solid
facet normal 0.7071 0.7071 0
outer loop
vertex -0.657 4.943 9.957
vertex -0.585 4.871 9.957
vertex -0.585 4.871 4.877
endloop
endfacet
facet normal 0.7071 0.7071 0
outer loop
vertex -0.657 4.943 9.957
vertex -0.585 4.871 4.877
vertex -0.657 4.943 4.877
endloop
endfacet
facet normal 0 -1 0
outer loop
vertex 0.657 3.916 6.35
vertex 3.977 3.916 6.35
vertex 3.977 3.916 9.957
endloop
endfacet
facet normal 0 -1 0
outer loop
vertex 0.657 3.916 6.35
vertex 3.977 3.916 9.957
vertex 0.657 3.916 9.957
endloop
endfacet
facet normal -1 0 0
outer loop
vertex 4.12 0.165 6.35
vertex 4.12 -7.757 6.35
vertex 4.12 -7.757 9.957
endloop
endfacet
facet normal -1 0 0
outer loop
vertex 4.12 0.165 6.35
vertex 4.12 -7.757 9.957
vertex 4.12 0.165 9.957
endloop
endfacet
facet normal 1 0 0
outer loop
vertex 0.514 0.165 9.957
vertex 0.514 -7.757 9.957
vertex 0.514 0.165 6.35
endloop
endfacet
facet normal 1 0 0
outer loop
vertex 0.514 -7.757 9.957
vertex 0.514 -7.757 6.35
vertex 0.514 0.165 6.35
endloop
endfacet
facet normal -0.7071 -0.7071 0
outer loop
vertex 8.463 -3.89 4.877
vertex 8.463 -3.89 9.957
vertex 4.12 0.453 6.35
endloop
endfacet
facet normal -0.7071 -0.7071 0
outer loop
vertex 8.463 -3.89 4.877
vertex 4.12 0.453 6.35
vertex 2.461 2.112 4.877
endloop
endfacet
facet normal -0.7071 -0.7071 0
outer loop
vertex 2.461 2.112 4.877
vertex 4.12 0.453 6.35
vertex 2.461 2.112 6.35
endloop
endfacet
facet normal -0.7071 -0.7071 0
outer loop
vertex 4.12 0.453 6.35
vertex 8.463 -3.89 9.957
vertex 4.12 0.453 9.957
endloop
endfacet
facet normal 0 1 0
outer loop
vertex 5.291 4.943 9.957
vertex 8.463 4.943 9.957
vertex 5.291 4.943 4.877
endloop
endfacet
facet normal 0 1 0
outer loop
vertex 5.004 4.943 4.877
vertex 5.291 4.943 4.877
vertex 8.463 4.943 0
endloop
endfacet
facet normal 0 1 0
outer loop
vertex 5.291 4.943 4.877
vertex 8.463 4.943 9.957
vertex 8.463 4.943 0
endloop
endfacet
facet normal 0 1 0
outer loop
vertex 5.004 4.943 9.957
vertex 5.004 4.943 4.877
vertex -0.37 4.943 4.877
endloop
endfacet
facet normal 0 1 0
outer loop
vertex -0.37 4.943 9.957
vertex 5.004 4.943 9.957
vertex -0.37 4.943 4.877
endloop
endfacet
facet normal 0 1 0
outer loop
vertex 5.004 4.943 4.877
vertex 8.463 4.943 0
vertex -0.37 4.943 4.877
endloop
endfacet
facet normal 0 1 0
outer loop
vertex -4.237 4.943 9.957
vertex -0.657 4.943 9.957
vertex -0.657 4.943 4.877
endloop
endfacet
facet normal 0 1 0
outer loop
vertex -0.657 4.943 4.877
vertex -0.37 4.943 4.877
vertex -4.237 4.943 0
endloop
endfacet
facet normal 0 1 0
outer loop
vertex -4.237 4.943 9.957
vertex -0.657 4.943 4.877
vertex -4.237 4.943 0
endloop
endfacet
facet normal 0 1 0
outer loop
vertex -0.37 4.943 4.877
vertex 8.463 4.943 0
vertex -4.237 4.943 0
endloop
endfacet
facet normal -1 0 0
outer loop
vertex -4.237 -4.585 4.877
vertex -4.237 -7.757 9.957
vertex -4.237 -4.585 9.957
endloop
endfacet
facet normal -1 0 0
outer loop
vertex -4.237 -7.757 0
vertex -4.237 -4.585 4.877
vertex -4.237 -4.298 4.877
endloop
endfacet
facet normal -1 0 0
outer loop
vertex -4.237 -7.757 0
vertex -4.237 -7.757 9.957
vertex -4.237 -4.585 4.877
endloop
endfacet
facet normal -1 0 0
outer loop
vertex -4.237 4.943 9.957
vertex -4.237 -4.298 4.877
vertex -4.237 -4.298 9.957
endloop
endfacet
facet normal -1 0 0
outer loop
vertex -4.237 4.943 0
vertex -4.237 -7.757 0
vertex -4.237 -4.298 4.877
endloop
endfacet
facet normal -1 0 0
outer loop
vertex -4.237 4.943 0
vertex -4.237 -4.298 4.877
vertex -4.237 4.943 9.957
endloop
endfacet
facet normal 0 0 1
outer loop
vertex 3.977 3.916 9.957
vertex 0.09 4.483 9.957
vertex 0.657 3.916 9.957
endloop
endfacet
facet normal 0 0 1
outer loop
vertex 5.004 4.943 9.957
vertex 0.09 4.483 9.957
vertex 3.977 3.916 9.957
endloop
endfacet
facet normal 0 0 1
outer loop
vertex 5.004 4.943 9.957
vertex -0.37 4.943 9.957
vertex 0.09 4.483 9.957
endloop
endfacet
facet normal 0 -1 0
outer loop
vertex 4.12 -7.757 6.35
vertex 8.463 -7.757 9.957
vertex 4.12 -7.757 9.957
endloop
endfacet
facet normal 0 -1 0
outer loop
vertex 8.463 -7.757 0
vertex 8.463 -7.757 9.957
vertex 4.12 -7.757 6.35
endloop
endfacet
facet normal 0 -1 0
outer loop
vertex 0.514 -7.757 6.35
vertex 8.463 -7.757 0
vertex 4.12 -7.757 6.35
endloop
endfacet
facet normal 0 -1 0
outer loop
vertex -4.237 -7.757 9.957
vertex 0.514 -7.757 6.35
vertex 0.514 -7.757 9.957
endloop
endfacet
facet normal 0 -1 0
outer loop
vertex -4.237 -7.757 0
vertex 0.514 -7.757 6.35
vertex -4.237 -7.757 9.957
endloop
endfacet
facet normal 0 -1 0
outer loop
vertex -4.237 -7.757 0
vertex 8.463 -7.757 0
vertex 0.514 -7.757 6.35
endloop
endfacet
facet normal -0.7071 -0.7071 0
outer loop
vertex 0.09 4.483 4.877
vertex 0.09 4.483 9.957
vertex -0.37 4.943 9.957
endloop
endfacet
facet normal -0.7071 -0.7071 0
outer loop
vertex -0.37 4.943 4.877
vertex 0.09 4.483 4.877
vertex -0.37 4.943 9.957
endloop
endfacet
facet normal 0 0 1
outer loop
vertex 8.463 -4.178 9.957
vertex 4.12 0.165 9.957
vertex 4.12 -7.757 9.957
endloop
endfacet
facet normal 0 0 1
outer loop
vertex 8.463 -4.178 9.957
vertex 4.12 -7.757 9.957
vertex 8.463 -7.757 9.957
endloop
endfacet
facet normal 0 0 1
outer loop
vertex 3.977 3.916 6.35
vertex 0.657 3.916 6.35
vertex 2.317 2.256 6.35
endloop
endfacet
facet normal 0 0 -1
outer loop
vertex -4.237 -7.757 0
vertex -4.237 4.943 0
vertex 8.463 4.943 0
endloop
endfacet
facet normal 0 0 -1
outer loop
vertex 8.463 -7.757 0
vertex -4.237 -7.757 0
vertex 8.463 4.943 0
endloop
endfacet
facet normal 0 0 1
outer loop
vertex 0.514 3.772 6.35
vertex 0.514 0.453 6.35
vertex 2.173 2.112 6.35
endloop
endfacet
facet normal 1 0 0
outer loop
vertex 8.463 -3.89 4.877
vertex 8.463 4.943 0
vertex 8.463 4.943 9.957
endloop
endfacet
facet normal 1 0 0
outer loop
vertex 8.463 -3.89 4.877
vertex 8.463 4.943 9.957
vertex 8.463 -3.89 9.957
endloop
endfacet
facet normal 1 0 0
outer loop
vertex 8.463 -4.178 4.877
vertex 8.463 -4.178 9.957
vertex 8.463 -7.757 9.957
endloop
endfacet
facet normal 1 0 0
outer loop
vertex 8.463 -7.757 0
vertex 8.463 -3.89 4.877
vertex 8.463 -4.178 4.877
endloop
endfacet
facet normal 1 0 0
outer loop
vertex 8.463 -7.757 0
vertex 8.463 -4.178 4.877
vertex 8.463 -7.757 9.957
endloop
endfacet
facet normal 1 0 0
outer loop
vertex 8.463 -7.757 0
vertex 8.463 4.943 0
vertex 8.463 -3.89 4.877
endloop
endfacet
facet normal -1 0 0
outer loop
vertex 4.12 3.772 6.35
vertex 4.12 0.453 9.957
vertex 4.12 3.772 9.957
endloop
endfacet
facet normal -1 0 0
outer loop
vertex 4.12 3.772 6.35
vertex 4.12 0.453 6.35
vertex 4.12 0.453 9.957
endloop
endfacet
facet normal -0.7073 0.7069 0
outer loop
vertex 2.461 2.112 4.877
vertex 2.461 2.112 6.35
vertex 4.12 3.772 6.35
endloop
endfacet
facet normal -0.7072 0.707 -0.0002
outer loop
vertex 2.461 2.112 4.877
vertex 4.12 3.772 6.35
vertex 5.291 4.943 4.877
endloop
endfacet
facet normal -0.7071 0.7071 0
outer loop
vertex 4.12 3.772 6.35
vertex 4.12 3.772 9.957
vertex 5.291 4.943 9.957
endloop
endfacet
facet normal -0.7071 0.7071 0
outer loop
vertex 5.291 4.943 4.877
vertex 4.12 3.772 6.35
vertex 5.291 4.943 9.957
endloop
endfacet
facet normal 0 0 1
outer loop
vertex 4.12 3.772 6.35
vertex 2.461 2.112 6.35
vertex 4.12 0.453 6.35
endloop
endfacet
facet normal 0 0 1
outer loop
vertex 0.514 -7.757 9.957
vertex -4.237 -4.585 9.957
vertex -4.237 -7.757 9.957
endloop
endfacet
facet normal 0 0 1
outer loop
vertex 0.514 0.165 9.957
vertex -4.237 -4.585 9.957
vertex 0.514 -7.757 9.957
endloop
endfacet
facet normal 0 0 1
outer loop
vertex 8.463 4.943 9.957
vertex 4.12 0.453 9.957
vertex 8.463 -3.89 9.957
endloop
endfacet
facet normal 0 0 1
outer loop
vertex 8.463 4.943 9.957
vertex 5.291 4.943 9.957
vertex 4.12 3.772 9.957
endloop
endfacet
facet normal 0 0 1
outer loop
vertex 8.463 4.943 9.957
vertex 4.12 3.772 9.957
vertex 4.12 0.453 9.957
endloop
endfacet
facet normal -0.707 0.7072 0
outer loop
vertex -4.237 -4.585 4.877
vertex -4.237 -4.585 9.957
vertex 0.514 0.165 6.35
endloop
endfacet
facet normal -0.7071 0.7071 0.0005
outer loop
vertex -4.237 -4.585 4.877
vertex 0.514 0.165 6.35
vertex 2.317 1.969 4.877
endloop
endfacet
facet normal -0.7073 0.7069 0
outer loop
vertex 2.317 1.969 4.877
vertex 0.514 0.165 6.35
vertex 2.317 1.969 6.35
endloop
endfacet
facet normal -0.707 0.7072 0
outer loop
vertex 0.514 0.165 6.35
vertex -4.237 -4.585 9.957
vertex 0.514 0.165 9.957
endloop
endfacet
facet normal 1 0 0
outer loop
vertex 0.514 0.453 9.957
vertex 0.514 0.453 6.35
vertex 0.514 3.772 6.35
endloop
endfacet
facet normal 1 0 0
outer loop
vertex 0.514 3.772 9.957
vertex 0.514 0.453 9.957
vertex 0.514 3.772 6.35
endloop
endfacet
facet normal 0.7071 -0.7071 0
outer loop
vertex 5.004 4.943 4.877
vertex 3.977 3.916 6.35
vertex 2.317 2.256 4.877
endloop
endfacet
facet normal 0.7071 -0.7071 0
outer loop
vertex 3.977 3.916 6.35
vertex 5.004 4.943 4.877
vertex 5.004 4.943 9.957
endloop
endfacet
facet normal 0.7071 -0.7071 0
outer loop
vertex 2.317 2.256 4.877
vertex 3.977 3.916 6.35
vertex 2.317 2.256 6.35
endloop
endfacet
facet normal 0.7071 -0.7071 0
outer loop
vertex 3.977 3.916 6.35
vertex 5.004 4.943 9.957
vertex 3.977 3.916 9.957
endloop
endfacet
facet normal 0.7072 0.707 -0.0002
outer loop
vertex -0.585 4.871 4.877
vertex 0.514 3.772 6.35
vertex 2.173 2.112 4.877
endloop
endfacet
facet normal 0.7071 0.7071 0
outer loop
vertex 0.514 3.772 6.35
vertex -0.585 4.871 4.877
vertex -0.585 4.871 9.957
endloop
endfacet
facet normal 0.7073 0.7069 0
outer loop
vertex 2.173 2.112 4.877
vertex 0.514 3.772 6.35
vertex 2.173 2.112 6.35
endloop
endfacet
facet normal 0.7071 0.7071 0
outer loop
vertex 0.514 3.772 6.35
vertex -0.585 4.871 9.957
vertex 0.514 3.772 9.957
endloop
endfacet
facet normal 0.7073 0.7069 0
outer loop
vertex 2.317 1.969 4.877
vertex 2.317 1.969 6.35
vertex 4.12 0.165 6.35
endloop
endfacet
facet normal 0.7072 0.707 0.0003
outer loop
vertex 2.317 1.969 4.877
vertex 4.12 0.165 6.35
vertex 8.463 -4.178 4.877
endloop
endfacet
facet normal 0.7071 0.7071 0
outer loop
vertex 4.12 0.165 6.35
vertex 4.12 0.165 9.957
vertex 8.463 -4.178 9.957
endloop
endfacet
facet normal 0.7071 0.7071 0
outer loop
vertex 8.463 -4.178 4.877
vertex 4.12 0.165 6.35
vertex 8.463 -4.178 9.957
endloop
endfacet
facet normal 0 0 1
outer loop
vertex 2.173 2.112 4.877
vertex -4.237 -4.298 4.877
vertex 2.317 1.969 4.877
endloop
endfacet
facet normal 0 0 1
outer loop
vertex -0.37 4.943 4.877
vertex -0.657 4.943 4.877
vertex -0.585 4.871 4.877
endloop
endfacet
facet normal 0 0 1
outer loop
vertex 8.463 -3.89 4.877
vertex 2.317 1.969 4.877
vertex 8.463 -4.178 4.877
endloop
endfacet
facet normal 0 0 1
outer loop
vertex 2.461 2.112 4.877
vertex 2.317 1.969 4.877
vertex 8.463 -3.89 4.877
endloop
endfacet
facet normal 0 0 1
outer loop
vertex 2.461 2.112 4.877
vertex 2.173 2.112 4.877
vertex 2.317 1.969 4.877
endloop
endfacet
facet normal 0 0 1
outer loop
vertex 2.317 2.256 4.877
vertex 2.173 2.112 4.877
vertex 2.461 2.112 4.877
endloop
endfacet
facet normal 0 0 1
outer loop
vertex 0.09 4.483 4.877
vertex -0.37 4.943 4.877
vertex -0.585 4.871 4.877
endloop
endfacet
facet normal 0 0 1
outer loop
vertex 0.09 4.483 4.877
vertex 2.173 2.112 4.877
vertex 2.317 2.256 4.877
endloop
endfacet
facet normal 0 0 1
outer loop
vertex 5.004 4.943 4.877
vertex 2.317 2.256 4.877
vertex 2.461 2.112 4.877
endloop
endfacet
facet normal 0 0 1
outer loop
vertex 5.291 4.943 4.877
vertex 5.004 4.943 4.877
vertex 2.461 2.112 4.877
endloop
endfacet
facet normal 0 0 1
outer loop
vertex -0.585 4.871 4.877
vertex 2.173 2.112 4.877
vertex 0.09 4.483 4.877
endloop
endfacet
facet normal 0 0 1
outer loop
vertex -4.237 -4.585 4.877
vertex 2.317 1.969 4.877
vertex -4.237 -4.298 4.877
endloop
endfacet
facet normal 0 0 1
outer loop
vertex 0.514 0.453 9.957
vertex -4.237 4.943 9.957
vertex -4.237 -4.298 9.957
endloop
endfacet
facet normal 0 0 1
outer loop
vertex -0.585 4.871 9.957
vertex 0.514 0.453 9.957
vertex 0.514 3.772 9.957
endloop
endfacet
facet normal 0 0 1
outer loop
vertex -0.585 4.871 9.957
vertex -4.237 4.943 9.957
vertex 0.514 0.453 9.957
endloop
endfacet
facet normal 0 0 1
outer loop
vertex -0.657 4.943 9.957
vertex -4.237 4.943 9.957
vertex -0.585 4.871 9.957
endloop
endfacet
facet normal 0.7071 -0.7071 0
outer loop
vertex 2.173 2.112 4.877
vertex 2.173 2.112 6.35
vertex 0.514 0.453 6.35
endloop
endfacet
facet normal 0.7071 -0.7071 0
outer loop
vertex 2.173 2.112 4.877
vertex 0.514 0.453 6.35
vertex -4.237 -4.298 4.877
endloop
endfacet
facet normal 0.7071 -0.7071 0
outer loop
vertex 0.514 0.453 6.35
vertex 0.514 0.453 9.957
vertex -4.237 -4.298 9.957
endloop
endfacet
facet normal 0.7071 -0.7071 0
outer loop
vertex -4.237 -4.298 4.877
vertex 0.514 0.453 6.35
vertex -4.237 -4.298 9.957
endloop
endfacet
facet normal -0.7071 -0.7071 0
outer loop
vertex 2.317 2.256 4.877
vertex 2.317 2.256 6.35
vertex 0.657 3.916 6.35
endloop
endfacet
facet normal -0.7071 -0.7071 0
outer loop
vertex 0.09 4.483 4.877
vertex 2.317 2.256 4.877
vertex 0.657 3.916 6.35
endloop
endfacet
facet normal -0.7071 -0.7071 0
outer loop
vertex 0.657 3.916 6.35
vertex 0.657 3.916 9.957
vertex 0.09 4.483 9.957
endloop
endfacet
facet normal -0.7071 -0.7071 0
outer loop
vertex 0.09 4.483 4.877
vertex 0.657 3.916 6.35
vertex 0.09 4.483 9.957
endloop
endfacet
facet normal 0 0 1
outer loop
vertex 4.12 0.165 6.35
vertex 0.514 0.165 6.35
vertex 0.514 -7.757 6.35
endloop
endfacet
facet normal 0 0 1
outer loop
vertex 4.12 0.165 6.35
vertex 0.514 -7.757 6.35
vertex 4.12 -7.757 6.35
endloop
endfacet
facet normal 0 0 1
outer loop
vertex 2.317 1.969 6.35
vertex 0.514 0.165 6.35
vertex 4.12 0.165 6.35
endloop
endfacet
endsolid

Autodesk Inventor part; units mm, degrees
ref_plane "YZ Plane" through (0, 0, 0) normal (1, 0, 0) x (0, 1, 0)
ref_plane "XZ Plane" through (0, 0, 0) normal (0, 1, 0) x (-1, 0, 0)
ref_plane "XY Plane" through (0, 0, 0) normal (0, 0, 1) x (1, 0, 0)
sketch "Sketch1" plane through (0, 0, 0) normal (0, 0, 1) x (1, 0, 0)
  line L0 (-4.2367, 4.9428) -> (8.4633, 4.9428)
  line L1 (8.4633, 4.9428) -> (8.4633, -7.7572)
  line L2 (8.4633, -7.7572) -> (-4.2367, -7.7572)
  line L3 (-4.2367, -7.7572) -> (-4.2367, 4.9428)
  point P0 (0, 0)
  dimension "d0" = 12.7
  dimension "d1" = 12.7
extrude "Extrusion1" add sketch "Sketch1" along normal blind 6.35
sketch "Sketch2" plane through (0, 0, 6.35) normal (0, 0, 1) x (1, 0, 0)
  line L0 (-4.2367, -7.7572) -> (8.4633, -7.7572) projected
  line L1 (0.5135, -7.7572) -> (4.1203, -7.7572)
  line L2 (4.1203, -7.7572) -> (4.1203, 4.9428)
  line L3 (8.4633, 4.9428) -> (-4.2367, 4.9428) projected
  line L4 (4.1203, 4.9428) -> (0.5135, 4.9428)
  line L5 (0.5135, -7.7572) -> (0.5135, 4.9428)
  line L6 (0.5135, 4.9428) -> (-4.2367, 4.9428)
  line L7 (-4.2367, 4.9428) -> (-4.2367, -7.7572)
  line L8 (-4.2367, -7.7572) -> (0.5135, -7.7572)
  line L9 (0.5135, -7.7572) -> (0.5135, 4.9428)
  line L10 (4.1203, 4.9428) -> (8.4633, 4.9428)
  line L11 (8.4633, 4.9428) -> (8.4633, -7.7572)
  line L12 (8.4633, -7.7572) -> (4.1203, -7.7572)
  line L13 (4.1203, -7.7572) -> (4.1203, 4.9428)
  point P0 (0, 0)
  dimension "d4" = 3.6068
extrude "Extrusion2" add sketch "Sketch2" along normal blind 3.6068 contours L7 L3 L5 L0 | L2 L3 L11 L0
sketch "Sketch3" plane through (0, 0, 6.35) normal (0, 0, 1) x (1, 0, 0)
  line L0 (4.1203, 4.9428) -> (0.5135, 4.9428) projected
  line L1 (4.1203, 4.9428) -> (4.1203, -7.7572) projected
  line L2 (0.5135, 4.9428) -> (4.1203, 4.9428)
  line L3 (4.1203, 4.9428) -> (4.1203, 3.9157)
  line L4 (4.1203, 3.9157) -> (0.5135, 3.9157)
  line L5 (0.5135, 3.9157) -> (0.5135, 4.9428)
  point P0 (0, 0)
extrude "Extrusion3" add sketch "Sketch3" along normal blind 3.6068
sketch "Sketch4" plane through (0, 0, 9.9568) normal (0, 0, 1) x (1, 0, 0)
  line L0 (0.5135, -7.7572) -> (0.5135, 3.9157) projected
  line L1 (0.5135, 3.9157) -> (11.3187, 3.9157) construction
  line L2 (4.1203, -7.7572) -> (4.1203, 3.9157) projected
  line L3 (-4.2367, 4.9428) -> (-4.2367, -7.7572) projected
  line L4 (8.4633, 4.9428) -> (-4.2367, 4.9428) projected
  line L5 (8.4633, -7.7572) -> (8.4633, 4.9428) projected
  line L6 (8.4633, -6.0235) -> (8.4633, -1.9417)
  line L7 (-4.2367, -2.4282) -> (-4.2367, -6.55)
  line L8 (8.4633, -4.1258) -> (8.4633, -3.8394)
  line L9 (-4.2367, -4.6399) -> (-4.2367, -4.3516)
  line L10 (0.5135, 3.9157) -> (8.4633, -4.0341) construction
  line L11 (0.5135, 3.9157) -> (11.7563, 3.9157) construction
  line L12 (4.1203, 3.9157) -> (-3.8295, -4.0341) construction
  line L13 (4.1203, 3.9157) -> (15.3631, 3.9157) construction
  line L14 (4.1203, 3.9157) -> (5.1474, 4.9428) construction
  line L15 (0.5135, 3.9157) -> (-0.5135, 4.9428) construction
  line L16 (-0.5854, 4.8709) -> (8.4633, -4.1778)
  line L17 (8.4633, -3.8904) -> (0.0898, 4.4832)
  line L18 (0.0898, 4.4832) -> (-0.3699, 4.9428)
  line L19 (-0.5854, 4.8709) -> (-0.6572, 4.9428)
  line L20 (-3.6868, -4.0351) -> (5.3778, 5.0295)
  line L21 (4.5252, 4.4643) -> (-4.2367, -4.2976)
  line L22 (-3.6868, -4.0351) -> (-4.2367, -4.585)
  line L23 (-4.2367, -4.2976) -> (-4.2367, -4.585)
  line L24 (5.3778, 5.0295) -> (5.0904, 5.0295)
  line L25 (5.0904, 5.0295) -> (4.5252, 4.4643)
  point P0 (0, 0)
  dimension "d22" = 45
  dimension "d23" = 135
  dimension "d24" = 0.2032
  dimension "d25" = 0.2032
extrude "Extrusion7" cut sketch "Sketch4" against normal blind 5.08 contours L20 L22 L3 L21 L0 | L0 L21 L16 L20 | L20 L17 L2 L16 | L16 L21 L17 L20 | L16 L19 L4 L18 L17 L21 | L2 L17 L5 L16 | L17 L21 L25 L4 L20 | L4 L25 L24 L20
sketch "Sketch7" plane through (0, 0, 9.9568) normal (0, 0, 1) x (1, 0, 0)
  point P0 (0, 0)
properties part number "crosspiecejig"
